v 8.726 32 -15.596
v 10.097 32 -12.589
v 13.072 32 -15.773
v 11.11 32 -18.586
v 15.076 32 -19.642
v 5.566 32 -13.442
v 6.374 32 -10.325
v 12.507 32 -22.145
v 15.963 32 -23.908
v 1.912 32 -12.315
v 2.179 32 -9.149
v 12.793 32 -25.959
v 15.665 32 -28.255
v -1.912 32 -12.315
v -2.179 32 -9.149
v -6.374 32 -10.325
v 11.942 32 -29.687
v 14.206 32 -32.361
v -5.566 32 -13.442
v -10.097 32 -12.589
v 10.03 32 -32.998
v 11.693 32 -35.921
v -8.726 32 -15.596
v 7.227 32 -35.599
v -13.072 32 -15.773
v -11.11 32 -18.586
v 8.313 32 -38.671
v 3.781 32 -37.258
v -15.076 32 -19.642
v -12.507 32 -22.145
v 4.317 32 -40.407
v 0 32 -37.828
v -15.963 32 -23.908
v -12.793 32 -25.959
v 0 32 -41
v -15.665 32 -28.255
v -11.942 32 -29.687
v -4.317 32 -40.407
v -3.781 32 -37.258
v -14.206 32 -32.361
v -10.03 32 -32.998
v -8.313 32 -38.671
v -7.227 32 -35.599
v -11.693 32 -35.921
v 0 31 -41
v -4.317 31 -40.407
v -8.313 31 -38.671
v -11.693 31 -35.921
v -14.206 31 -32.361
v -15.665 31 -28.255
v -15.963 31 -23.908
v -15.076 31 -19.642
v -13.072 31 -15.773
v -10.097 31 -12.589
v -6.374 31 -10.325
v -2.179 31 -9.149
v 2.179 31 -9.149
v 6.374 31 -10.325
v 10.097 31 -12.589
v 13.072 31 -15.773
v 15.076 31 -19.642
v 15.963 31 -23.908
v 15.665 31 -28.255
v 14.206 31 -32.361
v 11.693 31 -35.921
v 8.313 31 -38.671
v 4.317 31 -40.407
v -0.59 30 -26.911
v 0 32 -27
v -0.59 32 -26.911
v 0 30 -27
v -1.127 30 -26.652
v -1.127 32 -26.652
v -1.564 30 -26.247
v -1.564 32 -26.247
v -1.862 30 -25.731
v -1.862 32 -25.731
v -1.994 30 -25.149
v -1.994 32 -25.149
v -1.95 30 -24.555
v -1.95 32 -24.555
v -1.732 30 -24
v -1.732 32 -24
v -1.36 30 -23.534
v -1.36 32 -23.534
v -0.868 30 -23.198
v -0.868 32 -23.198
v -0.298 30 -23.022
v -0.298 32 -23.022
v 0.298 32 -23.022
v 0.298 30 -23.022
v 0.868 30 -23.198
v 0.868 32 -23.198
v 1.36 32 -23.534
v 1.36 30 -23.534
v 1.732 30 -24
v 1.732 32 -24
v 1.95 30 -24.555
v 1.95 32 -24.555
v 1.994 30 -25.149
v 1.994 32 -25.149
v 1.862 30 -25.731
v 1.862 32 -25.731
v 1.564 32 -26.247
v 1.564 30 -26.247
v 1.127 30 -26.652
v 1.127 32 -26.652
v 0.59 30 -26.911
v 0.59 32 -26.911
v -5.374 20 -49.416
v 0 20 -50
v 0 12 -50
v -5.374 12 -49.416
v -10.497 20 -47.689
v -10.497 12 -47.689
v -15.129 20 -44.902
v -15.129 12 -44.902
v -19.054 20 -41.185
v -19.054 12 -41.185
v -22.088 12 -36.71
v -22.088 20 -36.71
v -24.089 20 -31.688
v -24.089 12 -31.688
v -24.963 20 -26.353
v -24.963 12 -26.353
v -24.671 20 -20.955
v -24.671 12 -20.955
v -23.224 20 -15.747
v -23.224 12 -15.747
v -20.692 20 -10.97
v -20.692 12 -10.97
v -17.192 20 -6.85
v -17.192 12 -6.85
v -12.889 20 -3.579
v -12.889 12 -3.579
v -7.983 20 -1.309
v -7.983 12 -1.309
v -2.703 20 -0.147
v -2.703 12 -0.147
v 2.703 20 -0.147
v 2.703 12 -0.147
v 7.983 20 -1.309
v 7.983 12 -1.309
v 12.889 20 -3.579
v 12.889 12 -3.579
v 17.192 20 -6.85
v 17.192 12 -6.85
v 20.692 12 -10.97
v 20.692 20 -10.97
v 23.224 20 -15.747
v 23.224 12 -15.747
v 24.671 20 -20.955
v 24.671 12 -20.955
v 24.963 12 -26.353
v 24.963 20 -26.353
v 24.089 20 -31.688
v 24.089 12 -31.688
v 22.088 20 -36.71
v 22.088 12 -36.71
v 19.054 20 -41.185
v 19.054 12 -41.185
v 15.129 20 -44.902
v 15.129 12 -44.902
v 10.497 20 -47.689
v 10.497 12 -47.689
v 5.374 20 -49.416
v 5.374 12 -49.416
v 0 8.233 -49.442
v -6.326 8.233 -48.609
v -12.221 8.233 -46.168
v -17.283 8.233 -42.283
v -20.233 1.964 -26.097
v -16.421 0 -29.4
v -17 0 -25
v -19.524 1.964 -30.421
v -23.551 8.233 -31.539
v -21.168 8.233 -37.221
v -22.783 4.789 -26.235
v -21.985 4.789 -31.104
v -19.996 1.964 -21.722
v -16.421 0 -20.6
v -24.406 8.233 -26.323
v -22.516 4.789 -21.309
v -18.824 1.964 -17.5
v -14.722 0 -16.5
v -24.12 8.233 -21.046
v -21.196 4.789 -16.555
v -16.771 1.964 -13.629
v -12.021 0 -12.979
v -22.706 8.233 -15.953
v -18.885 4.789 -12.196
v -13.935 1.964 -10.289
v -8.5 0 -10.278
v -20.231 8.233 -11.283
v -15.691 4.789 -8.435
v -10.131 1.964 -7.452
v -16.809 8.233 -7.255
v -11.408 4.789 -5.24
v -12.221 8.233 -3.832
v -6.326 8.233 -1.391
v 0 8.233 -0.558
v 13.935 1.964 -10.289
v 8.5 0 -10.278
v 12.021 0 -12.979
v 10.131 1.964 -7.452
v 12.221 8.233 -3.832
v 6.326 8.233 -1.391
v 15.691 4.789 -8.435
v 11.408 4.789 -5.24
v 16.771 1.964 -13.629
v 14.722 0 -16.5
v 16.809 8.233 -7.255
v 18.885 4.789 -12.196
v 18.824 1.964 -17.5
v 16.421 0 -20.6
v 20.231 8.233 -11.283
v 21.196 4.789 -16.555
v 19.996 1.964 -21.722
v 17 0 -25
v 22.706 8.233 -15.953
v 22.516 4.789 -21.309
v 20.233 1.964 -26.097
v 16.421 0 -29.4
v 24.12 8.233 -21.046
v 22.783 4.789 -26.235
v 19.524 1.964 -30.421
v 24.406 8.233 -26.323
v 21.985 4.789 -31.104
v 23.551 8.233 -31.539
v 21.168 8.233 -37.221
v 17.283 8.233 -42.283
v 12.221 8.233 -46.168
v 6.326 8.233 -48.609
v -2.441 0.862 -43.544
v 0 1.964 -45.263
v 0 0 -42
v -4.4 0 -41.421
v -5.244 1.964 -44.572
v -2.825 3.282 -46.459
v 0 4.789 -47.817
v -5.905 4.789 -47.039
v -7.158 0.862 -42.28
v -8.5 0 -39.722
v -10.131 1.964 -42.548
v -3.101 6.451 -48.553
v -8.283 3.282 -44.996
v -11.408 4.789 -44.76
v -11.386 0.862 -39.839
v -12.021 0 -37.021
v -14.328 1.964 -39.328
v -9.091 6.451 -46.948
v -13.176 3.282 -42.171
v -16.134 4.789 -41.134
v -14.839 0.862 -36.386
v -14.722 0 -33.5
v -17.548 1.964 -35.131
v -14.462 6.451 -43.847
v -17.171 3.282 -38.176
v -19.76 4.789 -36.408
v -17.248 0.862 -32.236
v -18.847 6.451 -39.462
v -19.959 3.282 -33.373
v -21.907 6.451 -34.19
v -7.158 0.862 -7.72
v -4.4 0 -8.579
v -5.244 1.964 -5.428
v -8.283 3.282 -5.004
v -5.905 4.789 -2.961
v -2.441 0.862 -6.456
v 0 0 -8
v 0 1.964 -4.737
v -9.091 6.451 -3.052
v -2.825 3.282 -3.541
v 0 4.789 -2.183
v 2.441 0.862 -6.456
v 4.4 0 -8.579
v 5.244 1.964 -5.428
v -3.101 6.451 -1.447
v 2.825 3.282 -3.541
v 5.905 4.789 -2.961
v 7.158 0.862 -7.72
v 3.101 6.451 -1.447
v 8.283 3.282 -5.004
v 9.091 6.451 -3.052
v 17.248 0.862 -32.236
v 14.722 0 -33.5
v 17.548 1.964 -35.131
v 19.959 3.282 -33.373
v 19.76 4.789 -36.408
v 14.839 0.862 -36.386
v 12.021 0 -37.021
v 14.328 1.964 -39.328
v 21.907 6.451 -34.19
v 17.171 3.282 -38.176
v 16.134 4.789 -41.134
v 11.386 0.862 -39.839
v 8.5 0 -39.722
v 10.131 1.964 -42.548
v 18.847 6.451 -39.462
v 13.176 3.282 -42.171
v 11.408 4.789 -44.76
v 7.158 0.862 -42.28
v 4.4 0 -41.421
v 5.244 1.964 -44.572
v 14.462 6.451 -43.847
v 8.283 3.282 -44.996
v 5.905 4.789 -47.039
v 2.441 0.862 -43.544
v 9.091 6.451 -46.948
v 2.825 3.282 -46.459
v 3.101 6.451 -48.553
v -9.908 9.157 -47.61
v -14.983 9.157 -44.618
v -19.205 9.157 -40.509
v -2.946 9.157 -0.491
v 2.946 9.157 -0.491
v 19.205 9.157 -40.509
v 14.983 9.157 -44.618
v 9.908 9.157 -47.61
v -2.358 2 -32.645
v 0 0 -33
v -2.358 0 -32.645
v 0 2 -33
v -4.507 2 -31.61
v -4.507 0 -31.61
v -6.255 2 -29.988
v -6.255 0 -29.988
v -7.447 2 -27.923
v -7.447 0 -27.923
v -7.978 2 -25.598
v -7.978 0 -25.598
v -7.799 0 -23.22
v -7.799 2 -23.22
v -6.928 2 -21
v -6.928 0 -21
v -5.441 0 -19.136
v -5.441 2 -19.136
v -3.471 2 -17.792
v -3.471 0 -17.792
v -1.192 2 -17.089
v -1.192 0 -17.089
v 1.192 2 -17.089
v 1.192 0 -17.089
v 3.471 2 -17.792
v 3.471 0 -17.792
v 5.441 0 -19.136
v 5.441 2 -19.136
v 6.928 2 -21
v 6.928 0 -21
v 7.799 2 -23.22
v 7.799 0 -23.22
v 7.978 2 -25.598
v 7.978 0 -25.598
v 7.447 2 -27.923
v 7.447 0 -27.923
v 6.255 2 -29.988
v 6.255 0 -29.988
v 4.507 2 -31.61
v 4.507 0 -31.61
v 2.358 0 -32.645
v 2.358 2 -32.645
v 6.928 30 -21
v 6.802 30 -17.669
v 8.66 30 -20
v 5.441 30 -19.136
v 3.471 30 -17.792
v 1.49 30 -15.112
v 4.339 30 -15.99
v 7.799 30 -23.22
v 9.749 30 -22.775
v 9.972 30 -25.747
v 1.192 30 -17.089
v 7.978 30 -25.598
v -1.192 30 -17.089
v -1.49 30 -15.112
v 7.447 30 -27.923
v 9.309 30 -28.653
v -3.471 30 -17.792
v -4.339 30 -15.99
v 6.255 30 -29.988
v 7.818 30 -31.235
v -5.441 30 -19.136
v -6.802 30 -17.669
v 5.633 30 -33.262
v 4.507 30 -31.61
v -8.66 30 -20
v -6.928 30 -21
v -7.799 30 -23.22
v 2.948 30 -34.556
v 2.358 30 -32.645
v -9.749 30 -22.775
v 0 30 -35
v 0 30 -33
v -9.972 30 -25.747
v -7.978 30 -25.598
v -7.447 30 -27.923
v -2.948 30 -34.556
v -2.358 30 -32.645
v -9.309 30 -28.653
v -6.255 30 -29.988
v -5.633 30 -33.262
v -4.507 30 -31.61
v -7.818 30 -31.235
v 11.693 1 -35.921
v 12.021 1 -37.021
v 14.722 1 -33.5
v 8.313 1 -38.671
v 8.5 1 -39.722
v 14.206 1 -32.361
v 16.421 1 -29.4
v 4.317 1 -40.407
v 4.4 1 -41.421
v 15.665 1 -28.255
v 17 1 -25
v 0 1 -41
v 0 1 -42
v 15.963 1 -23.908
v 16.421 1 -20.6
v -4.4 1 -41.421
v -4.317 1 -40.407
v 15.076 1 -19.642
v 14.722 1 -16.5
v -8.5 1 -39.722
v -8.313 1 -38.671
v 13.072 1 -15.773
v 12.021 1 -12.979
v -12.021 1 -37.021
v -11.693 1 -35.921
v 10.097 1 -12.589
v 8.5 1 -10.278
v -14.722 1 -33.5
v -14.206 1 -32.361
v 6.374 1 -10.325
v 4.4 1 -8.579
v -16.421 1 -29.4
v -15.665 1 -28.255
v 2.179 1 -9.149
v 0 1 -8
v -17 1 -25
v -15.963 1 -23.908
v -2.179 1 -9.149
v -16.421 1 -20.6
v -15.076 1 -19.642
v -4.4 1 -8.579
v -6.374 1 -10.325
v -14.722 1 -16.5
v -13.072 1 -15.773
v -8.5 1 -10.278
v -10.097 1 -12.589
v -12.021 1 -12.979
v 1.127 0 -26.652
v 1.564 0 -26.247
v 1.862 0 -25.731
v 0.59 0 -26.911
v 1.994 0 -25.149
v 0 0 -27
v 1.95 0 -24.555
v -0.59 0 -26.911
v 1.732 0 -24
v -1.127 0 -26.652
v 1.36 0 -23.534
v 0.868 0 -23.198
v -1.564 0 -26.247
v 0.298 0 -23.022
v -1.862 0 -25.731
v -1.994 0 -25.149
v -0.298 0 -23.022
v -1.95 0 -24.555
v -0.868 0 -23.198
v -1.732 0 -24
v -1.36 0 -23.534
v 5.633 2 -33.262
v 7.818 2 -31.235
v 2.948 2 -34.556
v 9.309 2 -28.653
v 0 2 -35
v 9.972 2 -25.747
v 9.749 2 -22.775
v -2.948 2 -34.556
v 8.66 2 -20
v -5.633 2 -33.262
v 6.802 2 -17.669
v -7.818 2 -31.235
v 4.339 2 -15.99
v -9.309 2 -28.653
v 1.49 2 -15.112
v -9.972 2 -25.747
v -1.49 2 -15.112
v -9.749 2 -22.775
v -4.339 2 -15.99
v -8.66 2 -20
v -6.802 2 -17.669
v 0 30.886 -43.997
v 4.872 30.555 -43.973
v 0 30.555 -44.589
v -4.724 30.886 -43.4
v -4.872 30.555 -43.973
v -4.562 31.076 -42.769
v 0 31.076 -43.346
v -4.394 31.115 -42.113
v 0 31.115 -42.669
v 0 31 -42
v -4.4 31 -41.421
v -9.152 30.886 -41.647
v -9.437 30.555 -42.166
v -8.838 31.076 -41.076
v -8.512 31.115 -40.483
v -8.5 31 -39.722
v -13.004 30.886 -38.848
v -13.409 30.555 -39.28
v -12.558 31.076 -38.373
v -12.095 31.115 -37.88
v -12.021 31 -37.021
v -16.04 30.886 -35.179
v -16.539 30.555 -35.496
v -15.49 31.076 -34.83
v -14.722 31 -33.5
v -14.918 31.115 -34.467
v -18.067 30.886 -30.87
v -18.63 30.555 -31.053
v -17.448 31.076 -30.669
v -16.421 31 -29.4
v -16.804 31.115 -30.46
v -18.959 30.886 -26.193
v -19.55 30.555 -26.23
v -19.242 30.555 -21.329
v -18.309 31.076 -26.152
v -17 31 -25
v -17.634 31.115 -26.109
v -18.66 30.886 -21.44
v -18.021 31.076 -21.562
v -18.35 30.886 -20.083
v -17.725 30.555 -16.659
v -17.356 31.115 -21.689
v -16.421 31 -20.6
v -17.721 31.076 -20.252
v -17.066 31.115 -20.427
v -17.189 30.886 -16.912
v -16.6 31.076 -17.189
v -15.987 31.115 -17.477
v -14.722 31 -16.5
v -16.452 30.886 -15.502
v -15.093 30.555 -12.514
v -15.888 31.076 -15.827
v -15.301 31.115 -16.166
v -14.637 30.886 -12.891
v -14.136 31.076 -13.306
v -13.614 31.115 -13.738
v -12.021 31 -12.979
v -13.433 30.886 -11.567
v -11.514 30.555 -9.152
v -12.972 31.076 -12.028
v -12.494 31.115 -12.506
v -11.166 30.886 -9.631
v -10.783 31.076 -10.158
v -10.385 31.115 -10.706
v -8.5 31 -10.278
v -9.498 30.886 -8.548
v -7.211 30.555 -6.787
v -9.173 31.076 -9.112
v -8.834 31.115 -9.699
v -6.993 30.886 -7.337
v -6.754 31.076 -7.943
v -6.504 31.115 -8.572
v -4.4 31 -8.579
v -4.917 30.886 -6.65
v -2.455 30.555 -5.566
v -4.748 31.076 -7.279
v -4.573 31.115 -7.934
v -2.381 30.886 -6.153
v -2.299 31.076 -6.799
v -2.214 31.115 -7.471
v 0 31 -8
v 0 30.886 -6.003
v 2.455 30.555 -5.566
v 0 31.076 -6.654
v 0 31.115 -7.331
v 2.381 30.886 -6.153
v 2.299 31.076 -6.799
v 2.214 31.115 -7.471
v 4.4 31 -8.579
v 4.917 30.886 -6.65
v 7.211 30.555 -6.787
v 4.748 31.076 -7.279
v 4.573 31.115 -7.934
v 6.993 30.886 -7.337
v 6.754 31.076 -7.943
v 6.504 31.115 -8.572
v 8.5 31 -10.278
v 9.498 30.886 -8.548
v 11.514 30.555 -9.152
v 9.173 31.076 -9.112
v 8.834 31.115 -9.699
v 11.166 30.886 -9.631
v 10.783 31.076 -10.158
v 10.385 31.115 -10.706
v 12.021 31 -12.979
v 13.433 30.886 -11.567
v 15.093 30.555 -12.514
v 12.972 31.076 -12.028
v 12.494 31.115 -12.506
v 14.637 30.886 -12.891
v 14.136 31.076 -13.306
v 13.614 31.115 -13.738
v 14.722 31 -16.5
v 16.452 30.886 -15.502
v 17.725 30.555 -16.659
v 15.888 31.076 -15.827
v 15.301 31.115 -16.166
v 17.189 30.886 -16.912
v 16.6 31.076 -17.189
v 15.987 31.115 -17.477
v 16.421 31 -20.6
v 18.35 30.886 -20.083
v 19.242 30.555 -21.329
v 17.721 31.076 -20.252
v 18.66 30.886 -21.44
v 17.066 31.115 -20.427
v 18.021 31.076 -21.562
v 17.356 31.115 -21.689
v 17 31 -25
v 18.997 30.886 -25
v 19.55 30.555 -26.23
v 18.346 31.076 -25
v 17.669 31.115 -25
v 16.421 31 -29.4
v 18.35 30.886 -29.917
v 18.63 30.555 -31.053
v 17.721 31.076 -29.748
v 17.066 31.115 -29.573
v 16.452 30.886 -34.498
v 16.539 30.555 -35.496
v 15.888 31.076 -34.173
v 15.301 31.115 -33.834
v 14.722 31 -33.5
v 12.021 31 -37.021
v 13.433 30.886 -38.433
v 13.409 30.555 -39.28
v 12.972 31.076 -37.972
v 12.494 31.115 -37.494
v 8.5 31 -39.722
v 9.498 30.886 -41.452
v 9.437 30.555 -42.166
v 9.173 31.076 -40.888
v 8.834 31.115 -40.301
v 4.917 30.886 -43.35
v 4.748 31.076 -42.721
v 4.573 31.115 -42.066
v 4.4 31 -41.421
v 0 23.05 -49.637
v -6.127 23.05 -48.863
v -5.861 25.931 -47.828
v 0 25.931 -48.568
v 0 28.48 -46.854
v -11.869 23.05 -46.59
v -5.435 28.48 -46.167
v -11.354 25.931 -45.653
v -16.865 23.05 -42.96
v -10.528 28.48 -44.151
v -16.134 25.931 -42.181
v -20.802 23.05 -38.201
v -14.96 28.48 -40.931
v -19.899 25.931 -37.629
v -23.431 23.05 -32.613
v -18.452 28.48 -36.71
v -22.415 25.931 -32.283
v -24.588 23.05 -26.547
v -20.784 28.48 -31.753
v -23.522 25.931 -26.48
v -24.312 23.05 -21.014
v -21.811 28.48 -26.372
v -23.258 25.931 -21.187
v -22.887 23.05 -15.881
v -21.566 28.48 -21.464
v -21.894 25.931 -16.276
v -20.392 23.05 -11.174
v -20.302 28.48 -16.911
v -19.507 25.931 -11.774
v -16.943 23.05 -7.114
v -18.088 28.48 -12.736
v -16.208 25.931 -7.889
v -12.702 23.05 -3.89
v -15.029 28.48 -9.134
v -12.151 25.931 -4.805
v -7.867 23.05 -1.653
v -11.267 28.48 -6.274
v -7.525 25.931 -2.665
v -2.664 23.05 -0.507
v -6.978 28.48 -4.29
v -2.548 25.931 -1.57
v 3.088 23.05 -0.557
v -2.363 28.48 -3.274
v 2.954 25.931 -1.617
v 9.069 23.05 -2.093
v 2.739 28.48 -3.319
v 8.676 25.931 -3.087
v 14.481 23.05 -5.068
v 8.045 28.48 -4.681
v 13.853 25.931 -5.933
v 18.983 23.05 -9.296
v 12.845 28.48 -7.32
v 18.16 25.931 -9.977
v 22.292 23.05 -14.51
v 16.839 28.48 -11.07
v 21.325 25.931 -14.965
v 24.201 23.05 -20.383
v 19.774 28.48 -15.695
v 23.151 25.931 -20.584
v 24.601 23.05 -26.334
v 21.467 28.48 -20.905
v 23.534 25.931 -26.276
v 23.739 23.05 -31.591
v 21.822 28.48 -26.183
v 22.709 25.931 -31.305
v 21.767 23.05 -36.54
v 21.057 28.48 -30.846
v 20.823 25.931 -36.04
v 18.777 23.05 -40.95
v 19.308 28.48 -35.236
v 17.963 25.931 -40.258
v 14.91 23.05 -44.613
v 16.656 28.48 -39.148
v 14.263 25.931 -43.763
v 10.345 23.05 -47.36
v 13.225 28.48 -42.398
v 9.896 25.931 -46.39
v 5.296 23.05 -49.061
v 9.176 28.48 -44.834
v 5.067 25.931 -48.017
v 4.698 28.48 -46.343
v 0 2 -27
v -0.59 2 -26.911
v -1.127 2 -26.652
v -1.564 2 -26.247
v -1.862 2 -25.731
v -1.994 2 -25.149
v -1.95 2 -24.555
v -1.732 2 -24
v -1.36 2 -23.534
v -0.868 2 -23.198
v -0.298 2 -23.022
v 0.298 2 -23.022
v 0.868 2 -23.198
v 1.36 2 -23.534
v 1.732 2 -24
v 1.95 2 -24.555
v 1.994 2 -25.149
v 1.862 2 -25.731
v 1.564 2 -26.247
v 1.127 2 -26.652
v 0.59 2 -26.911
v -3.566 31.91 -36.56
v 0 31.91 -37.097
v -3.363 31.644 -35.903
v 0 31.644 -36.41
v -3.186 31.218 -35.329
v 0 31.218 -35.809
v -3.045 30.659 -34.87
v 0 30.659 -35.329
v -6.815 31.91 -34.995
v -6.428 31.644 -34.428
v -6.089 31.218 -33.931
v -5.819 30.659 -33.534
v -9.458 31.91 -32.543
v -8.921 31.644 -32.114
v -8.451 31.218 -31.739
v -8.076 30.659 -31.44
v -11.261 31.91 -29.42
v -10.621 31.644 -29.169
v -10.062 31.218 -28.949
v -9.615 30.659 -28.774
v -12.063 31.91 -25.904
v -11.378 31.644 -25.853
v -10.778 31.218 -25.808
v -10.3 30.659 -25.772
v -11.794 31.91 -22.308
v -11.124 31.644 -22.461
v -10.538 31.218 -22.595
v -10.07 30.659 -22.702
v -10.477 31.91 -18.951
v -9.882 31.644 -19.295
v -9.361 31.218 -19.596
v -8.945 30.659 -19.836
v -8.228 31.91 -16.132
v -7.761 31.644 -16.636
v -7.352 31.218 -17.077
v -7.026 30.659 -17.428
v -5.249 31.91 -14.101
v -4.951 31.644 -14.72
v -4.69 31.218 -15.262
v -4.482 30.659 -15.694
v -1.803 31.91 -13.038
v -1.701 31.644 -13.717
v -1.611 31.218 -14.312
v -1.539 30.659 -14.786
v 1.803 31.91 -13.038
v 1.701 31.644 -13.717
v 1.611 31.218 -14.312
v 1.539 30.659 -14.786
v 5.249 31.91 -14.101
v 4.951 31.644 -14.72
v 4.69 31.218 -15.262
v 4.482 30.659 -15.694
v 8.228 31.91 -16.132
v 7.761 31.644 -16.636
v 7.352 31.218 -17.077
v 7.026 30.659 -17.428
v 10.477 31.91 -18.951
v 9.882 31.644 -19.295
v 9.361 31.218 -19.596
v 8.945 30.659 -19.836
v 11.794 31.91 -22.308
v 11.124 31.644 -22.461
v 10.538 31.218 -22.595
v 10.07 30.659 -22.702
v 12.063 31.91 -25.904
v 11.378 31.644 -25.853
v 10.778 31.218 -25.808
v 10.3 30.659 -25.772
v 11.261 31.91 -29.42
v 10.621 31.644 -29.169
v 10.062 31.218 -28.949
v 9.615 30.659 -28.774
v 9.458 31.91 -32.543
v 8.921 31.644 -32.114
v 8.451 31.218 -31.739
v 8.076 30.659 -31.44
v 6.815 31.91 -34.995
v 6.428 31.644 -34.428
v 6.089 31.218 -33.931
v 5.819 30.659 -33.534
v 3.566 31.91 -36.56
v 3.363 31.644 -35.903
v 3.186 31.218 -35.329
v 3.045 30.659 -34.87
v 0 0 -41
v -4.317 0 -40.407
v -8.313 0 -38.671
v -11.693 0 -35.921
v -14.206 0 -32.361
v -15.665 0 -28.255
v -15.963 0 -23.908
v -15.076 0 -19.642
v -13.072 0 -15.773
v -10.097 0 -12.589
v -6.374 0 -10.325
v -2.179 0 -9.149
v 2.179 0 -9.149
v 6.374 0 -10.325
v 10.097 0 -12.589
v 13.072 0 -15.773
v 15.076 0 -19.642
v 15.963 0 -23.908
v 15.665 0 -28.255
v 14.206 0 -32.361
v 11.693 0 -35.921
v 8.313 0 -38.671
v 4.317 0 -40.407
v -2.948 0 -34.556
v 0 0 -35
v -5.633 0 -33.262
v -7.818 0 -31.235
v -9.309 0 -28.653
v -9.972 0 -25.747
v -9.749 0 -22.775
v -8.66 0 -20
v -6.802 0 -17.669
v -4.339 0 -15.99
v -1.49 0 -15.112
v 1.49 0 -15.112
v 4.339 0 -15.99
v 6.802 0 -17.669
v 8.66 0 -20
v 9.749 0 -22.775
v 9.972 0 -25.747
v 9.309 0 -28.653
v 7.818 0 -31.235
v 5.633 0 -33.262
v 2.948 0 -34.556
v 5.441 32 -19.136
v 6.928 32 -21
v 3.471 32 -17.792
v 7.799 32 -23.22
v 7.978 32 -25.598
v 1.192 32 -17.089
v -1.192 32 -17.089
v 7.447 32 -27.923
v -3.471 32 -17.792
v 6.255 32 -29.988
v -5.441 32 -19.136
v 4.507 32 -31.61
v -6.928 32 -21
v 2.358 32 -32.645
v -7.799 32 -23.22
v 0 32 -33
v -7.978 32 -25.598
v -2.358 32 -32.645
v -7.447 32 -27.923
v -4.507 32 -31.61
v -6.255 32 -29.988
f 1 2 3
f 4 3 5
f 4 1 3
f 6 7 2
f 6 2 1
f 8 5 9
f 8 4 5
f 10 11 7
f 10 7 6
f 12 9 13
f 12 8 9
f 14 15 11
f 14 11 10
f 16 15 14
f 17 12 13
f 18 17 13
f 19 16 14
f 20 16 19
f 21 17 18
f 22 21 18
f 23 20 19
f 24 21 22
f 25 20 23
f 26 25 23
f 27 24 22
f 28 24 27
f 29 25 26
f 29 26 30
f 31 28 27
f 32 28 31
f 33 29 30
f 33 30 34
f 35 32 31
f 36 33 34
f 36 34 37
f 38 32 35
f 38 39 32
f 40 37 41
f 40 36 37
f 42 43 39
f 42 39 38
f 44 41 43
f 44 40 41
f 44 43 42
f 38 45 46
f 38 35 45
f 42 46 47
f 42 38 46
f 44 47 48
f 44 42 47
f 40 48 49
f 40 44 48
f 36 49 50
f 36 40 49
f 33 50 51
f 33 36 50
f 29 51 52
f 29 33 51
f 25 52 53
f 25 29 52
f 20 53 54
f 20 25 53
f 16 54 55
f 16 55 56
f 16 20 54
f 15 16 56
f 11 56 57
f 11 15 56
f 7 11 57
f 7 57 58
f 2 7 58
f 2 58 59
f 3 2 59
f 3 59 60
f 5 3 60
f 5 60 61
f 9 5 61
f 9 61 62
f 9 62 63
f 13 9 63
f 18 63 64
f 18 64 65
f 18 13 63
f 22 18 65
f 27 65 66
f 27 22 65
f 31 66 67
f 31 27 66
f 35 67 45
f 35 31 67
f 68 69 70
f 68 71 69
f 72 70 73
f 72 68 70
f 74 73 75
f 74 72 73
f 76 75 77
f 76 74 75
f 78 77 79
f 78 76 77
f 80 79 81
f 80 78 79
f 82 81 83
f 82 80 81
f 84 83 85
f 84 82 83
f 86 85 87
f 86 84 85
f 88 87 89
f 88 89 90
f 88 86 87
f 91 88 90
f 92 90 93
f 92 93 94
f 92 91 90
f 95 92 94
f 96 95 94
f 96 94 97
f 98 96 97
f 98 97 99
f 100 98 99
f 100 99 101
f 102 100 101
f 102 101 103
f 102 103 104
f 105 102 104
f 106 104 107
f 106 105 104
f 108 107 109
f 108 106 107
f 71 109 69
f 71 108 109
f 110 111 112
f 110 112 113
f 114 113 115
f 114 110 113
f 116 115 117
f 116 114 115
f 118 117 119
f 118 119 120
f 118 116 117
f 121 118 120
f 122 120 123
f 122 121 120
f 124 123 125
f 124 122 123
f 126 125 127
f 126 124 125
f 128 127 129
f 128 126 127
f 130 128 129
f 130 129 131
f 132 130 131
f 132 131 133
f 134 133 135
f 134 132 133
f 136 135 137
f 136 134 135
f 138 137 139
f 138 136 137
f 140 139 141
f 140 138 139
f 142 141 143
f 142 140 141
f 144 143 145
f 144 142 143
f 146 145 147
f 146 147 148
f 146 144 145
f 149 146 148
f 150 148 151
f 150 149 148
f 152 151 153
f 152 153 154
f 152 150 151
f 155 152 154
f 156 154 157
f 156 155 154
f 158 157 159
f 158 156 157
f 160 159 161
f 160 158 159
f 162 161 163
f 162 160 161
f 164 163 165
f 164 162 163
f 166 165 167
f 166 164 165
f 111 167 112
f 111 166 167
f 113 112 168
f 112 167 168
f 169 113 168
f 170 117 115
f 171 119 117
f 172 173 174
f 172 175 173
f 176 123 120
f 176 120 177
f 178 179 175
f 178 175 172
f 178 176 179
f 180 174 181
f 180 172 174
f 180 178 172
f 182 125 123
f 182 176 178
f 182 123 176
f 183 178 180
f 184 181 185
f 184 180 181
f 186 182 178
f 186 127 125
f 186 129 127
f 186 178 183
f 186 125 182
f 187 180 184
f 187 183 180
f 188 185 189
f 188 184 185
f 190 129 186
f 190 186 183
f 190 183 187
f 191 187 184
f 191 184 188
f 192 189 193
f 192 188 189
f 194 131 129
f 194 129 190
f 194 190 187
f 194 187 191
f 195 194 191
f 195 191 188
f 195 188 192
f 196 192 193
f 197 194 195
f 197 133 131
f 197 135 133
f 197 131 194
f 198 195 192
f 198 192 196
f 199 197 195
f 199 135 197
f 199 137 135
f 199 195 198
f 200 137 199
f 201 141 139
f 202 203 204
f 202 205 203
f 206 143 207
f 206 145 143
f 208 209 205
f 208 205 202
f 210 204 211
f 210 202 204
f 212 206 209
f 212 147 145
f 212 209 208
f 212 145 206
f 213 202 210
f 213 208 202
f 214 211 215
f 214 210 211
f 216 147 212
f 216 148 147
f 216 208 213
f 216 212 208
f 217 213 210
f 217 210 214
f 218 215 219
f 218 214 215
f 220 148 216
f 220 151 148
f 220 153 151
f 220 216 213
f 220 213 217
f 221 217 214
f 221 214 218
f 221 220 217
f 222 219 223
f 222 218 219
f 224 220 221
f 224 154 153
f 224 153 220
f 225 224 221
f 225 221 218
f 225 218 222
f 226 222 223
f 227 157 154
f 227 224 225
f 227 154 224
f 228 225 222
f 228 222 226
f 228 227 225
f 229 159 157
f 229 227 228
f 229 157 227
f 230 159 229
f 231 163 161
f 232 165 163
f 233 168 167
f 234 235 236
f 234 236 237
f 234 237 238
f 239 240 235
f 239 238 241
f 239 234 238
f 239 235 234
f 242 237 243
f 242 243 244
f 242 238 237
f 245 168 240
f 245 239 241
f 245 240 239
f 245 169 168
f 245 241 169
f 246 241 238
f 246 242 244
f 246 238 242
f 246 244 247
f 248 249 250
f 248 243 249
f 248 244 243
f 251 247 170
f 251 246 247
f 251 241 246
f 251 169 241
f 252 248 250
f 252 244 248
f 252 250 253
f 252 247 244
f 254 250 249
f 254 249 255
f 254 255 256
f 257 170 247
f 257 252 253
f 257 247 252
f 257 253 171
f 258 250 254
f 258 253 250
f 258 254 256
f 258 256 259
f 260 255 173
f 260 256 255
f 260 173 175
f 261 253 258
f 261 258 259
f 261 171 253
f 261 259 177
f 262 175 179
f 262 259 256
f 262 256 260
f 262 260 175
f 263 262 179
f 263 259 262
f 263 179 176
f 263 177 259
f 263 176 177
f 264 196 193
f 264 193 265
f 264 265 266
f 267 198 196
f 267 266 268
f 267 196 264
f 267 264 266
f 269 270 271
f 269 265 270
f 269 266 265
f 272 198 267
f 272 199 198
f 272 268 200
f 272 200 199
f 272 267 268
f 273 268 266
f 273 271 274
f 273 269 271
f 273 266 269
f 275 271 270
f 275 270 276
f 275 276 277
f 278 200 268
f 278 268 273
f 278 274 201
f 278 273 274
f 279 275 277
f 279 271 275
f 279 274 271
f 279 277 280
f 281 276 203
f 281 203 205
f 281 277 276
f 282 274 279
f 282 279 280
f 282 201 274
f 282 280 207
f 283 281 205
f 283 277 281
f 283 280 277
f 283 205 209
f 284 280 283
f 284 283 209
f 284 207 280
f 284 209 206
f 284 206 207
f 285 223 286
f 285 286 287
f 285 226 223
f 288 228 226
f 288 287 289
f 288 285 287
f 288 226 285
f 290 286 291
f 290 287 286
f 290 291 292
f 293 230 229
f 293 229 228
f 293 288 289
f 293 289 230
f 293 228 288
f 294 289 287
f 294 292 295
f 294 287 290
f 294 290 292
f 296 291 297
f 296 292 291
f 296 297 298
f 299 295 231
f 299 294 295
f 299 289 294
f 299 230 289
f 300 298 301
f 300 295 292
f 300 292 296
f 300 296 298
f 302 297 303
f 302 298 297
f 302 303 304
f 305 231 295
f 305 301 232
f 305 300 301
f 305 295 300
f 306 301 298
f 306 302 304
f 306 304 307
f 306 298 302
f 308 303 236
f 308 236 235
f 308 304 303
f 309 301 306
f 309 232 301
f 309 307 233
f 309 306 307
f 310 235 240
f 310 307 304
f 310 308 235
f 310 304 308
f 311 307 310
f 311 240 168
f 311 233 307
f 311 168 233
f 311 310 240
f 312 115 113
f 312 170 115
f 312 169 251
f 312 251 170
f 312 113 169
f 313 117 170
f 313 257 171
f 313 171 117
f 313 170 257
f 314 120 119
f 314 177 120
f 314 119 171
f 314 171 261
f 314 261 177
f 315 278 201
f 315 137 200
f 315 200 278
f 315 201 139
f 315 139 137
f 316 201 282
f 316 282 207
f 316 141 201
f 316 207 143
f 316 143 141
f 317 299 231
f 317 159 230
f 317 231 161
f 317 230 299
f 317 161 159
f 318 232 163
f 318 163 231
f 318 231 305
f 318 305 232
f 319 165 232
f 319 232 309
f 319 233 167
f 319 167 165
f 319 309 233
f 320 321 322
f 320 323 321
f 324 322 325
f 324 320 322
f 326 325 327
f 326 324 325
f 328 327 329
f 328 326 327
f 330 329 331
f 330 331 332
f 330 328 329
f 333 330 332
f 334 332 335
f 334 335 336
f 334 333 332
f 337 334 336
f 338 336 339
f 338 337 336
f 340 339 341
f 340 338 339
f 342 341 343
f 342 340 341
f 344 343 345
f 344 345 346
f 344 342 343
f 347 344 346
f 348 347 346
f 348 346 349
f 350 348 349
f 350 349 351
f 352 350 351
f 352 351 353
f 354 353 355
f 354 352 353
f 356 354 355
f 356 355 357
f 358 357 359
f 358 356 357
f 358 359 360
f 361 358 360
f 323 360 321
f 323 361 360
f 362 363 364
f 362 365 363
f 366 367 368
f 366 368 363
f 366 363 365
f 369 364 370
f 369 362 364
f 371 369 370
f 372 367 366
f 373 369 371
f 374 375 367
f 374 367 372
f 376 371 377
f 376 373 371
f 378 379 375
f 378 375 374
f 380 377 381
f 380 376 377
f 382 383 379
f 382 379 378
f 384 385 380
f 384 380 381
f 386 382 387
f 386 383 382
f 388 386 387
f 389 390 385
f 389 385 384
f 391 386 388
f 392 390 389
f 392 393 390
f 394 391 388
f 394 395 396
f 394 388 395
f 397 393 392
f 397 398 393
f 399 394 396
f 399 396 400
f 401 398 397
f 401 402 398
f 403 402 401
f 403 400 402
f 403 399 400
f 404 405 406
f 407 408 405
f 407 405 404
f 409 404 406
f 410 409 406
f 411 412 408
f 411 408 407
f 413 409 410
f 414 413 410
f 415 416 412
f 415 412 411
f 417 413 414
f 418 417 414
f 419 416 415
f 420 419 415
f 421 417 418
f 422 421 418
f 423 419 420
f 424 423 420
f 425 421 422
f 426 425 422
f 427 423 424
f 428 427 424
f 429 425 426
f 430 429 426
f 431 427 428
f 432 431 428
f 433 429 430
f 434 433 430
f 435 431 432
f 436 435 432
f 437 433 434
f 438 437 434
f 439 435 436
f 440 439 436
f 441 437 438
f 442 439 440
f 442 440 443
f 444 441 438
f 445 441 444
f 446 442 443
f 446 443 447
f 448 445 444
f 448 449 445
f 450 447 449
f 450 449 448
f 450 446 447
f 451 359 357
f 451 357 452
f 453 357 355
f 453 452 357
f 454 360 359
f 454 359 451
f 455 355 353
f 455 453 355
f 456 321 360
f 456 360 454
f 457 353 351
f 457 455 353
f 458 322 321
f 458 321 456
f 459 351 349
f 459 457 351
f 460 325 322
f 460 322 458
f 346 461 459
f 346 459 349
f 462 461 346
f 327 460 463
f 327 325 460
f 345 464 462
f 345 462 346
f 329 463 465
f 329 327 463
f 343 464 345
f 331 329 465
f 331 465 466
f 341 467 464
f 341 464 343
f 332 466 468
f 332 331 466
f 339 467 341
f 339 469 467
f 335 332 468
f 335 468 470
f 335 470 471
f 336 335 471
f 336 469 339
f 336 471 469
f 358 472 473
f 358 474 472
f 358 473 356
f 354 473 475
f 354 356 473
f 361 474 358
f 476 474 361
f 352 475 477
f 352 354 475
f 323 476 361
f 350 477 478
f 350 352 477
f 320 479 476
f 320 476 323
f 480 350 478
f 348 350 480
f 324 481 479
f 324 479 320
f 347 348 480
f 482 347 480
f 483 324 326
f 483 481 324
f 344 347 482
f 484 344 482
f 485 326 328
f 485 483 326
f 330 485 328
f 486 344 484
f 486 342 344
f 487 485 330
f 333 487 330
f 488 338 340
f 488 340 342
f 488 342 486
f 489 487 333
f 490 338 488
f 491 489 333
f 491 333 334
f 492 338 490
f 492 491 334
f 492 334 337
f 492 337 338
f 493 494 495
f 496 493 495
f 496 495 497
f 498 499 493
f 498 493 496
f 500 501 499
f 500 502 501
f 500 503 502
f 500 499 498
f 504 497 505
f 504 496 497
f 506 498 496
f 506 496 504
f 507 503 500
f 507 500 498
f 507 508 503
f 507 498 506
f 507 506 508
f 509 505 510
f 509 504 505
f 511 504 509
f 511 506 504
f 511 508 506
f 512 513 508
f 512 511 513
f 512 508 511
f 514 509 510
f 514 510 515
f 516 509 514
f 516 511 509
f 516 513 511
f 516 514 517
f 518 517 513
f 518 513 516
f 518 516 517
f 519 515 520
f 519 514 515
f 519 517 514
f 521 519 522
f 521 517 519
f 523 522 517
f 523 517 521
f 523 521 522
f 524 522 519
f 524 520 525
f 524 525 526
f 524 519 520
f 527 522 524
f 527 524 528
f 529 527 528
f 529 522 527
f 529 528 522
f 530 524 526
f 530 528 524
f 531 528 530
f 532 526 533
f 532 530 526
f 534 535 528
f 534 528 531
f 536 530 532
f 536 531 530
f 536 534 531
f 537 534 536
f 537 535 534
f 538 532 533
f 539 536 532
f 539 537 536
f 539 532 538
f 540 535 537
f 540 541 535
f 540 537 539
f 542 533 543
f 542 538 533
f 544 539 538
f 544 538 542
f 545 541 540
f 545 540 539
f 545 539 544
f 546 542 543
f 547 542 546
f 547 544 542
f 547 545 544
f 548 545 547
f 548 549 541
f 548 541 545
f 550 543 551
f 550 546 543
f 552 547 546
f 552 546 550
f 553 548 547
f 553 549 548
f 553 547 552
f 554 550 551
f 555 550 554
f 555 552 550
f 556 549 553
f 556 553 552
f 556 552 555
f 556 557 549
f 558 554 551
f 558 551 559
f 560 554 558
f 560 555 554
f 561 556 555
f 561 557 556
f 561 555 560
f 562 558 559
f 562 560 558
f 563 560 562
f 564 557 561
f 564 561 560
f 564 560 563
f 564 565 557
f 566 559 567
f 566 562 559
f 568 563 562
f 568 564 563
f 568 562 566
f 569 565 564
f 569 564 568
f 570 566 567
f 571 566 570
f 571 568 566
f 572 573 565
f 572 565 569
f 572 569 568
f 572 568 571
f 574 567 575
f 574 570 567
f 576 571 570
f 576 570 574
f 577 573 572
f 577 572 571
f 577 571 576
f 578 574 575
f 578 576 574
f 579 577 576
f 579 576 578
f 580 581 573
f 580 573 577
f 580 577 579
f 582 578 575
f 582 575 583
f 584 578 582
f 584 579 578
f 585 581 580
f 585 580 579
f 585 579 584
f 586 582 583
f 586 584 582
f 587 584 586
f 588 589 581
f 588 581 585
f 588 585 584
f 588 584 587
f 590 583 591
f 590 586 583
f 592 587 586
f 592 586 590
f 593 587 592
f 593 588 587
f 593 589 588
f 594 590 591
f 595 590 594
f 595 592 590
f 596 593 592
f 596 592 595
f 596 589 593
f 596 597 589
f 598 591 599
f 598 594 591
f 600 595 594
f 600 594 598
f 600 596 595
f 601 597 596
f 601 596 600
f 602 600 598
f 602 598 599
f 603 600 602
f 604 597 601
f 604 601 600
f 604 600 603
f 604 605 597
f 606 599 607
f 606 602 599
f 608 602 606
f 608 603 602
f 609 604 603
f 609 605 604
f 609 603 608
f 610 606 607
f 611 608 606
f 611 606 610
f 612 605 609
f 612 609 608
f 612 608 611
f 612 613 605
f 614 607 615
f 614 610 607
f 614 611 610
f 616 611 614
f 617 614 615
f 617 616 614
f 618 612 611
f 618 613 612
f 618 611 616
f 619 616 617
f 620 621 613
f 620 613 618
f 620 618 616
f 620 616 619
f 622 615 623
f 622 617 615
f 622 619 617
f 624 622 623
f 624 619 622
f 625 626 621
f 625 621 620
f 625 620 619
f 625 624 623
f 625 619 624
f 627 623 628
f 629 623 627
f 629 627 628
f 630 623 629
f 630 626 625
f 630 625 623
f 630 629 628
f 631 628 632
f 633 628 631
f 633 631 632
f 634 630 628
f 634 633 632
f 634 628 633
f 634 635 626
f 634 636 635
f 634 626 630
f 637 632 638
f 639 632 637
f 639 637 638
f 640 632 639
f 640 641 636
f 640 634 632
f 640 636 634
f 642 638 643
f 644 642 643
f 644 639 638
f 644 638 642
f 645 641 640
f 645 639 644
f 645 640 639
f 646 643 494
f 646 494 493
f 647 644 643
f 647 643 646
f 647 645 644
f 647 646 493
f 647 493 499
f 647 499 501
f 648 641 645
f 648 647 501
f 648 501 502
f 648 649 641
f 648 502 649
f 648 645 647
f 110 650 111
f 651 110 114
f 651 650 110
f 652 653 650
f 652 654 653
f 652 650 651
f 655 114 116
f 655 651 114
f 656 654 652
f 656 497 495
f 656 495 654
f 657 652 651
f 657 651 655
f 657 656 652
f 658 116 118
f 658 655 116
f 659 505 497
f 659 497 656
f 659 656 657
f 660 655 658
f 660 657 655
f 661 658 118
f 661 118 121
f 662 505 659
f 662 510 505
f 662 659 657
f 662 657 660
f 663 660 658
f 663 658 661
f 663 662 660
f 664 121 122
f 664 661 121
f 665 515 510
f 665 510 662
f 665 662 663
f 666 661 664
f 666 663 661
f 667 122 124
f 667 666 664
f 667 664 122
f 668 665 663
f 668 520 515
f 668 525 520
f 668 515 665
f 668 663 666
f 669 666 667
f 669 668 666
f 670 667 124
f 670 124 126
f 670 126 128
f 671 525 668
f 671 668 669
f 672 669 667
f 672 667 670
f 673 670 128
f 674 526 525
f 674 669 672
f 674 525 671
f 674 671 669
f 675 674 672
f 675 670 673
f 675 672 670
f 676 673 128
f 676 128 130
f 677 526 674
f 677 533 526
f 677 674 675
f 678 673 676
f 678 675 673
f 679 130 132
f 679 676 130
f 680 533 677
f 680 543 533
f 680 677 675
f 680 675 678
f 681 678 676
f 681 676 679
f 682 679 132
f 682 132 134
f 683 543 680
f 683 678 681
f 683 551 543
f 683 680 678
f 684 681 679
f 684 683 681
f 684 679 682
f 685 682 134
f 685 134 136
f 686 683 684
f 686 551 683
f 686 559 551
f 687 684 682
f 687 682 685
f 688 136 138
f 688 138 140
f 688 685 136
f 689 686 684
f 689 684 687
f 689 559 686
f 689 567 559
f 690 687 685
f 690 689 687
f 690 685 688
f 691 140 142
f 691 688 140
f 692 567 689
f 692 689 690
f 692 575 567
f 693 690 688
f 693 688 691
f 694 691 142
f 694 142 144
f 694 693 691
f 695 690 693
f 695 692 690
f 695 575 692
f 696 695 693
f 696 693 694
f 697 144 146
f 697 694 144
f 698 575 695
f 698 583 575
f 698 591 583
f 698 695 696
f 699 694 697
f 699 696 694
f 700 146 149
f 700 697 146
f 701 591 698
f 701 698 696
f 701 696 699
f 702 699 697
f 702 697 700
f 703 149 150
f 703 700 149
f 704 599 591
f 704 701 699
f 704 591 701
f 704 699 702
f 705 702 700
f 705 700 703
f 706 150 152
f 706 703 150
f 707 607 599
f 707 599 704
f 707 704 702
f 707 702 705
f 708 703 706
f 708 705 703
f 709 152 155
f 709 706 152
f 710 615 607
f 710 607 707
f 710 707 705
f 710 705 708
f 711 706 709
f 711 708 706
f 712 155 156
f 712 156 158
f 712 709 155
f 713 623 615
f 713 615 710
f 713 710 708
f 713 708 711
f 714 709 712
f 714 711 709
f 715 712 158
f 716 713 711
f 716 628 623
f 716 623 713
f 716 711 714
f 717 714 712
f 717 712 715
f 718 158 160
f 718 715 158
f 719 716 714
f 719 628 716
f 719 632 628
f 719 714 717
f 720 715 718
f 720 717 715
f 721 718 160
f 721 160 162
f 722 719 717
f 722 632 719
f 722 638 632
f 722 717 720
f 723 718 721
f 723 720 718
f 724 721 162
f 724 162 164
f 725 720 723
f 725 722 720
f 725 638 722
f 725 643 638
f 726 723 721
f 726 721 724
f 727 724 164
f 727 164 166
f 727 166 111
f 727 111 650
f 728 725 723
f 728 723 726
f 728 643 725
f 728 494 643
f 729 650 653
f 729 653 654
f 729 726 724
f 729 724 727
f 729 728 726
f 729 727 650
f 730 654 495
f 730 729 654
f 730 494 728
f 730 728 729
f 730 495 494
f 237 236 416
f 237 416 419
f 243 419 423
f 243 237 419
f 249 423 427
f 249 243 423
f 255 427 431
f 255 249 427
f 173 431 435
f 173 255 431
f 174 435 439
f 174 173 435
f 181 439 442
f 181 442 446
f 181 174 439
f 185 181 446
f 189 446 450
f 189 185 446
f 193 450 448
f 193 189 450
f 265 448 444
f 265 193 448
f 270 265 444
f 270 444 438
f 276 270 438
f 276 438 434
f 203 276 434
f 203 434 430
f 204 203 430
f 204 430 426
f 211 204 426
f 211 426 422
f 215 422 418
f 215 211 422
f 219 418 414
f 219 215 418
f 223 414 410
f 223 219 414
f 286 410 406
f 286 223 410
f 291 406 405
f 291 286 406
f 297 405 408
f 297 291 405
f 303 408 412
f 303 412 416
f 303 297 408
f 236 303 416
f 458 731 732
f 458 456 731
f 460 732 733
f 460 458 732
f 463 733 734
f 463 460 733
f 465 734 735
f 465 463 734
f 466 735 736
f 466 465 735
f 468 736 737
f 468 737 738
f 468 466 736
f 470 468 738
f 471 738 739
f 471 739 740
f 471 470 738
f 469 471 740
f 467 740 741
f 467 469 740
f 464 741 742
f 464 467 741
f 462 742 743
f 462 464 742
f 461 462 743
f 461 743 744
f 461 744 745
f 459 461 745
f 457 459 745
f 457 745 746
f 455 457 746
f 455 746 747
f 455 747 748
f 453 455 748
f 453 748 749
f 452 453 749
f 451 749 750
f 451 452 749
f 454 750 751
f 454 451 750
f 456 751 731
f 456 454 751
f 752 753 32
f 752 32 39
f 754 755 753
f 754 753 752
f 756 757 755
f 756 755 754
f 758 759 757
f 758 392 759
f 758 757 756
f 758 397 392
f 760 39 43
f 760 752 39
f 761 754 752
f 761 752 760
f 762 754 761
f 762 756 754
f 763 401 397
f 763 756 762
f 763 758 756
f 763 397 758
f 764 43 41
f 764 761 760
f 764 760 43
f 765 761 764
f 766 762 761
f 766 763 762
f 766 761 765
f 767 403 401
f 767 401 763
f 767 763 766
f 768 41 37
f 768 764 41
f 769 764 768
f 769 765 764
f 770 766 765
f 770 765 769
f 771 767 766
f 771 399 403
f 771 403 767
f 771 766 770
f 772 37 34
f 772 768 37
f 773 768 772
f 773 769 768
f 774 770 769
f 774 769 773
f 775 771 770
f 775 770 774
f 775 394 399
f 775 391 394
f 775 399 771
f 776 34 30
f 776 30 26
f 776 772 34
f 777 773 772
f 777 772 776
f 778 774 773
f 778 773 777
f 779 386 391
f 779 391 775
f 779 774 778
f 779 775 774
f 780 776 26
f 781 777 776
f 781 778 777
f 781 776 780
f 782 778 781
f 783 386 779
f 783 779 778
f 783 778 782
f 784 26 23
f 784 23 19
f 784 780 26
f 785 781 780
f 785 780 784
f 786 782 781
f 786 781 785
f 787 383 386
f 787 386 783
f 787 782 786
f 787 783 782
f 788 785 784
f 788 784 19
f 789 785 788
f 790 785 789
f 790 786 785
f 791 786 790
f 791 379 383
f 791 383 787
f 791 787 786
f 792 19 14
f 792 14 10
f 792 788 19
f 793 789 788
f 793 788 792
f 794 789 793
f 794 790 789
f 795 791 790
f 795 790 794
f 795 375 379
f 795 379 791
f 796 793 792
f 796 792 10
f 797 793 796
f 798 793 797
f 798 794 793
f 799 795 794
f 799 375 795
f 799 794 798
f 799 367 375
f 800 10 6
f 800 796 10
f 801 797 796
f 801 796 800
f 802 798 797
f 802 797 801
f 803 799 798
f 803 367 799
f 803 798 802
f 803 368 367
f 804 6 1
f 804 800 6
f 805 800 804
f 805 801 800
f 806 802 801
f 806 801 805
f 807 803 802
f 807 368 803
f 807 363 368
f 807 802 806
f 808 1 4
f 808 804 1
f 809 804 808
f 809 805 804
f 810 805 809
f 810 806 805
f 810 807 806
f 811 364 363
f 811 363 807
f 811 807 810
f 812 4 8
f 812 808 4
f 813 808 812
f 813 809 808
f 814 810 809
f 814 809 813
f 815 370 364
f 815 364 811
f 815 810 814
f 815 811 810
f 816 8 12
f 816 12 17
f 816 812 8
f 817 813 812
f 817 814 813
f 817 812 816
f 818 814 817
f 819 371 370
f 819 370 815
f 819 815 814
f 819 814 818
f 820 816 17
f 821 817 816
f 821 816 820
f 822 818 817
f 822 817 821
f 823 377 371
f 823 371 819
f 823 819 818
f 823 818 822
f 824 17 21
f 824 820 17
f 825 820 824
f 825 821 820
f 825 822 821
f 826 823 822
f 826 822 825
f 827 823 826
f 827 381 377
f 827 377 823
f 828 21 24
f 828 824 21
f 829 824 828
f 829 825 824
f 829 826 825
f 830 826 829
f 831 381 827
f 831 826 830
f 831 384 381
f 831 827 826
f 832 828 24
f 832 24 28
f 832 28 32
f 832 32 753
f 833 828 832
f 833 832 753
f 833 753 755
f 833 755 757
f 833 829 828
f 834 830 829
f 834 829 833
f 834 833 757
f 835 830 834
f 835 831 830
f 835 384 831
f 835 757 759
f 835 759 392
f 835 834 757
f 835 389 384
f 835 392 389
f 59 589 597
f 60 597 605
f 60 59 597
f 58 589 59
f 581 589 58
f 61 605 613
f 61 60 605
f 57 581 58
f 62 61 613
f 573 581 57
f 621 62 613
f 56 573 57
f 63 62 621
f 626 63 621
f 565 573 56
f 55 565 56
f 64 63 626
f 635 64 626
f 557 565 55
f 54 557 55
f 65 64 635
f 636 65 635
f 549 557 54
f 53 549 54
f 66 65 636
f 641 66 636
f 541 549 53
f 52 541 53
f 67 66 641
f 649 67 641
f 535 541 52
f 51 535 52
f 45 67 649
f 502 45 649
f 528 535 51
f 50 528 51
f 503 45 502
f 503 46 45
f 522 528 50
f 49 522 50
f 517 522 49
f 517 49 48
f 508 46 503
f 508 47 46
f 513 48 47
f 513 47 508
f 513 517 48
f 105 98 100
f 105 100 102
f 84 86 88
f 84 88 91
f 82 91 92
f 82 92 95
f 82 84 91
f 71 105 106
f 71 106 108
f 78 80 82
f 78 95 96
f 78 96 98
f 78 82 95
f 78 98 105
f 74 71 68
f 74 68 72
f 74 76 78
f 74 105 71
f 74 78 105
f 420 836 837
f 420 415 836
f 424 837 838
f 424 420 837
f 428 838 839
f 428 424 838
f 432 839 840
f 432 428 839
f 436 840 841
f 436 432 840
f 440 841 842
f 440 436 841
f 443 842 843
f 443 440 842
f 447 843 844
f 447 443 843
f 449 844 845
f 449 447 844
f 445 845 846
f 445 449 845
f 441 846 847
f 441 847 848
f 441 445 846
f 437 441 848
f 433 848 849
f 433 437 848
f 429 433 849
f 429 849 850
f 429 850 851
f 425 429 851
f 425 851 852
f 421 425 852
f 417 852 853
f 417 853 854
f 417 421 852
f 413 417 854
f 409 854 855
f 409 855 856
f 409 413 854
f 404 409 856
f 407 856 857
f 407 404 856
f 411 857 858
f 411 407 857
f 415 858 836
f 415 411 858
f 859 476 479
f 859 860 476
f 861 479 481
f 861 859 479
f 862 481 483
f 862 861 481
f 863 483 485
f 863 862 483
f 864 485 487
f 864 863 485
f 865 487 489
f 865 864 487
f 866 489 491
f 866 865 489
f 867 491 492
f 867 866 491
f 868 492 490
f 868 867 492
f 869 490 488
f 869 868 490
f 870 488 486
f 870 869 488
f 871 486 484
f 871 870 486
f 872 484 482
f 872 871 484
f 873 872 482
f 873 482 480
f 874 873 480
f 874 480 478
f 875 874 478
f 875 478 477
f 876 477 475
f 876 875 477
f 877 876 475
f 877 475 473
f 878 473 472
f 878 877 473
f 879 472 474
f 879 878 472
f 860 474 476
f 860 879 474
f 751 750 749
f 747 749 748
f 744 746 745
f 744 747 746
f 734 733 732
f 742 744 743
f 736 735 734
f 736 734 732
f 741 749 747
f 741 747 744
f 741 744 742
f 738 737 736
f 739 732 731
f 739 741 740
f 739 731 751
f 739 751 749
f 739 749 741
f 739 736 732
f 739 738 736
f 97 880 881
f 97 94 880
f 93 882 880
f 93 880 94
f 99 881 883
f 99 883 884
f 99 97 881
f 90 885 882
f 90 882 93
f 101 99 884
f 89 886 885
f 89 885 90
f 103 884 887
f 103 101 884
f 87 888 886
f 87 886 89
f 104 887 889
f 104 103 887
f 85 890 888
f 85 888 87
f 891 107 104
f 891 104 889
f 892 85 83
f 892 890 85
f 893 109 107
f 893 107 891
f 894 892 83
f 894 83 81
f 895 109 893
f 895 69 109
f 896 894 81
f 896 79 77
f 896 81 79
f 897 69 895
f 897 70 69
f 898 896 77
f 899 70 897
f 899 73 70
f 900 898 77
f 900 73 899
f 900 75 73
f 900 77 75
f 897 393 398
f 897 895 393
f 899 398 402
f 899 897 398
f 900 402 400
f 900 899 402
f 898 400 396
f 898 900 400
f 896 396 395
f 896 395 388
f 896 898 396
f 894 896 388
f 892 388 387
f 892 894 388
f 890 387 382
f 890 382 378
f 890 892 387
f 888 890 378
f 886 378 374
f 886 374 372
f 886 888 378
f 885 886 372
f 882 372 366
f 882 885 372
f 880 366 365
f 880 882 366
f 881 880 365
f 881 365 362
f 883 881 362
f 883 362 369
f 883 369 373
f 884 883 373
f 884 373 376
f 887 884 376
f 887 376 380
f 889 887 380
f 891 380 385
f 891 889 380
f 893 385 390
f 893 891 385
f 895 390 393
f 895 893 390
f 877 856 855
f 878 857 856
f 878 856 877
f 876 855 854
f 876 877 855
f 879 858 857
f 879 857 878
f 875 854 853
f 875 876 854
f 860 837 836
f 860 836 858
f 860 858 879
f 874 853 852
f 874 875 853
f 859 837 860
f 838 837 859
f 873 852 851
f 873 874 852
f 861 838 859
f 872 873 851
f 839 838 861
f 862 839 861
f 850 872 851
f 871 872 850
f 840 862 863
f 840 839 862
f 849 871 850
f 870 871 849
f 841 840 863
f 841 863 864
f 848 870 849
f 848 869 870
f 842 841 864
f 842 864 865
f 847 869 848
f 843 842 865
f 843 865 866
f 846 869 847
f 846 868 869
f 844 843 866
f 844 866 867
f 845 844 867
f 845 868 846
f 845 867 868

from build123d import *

# Parameters (mm, degrees)
FILLET_1_R = 13
FILLET_3_R = 3
FILLET_4_R = 3


with BuildPart() as part:
    # 草图1 → 旋转1 (revolve)
    with BuildSketch(Plane(origin=(0, 0, 0), x_dir=(0, 0, -1), z_dir=(1, 0, 0)), mode=Mode.PRIVATE) as revolve_1_sk:
        Polygon((17, 32), (23, 32), (23, 30), (25, 30), (25, 2), (23, 2), (23, 0), (17, 0), (17, 2), (15, 2), (15, 0), (9, 0), (9, 1), (8, 1), (8, 0), (0, 0), (0, 32), (8, 32), (8, 31), (9, 31), (9, 32), (15, 32), (15, 30), (17, 30), align=None)
    revolve(revolve_1_sk.sketch.rotate(Axis((0, 2, -25), (0, 1, 0)), 180), axis=Axis((0, 2, -25), (0, 1, 0)))

    # 圆角1
    # the kernel refuses this fillet: 13 mm, written as the material it takes off along each edge
    with BuildSketch(Plane(origin=(0, 0, -25), x_dir=(0, 0, -1), z_dir=(1, 0, 0))) as fillet_1_piece_1:
        with BuildLine():
            CenterArc((12, 12), FILLET_1_R, 292.619864948, 67.380135052)
            Line((25, 12), (25.26, 12))
            Line((25.26, 12), (25.26, 0))
            Line((25.26, 0), (25, -0.26))
            ThreePointArc((25, -0.26), (21, -0.26), (17.1, -0.24))
            Line((17.1, -0.24), (17, 0))
        make_face()
    revolve(axis=Axis((0, 0, -25), (0, 1, 0)), mode=Mode.SUBTRACT)
    with BuildSketch(Plane(origin=(0, 32, -25), x_dir=(0, 0, -1), z_dir=(1, 0, 0))) as fillet_1_piece_2:
        with BuildLine():
            CenterArc((12, -12), FILLET_1_R, 0, 67.380135052)
            Line((17, 0), (17.1, 0.24))
            ThreePointArc((17.1, 0.24), (21, 0.26), (25, 0.26))
            Line((25, 0.26), (25.26, 0))
            Line((25.26, 0), (25.26, -12))
            Line((25.26, -12), (25, -12))
        make_face()
    revolve(axis=Axis((0, 32, -25), (0, 1, 0)), mode=Mode.SUBTRACT)

    # 圆角3
    # the kernel refuses this fillet: 3 mm, written as the material it takes off along each edge
    with BuildSketch(Plane(origin=(0, 32, -25), x_dir=(0, 0, -1), z_dir=(1, 0, 0))) as fillet_3_piece_1:
        with BuildLine():
            CenterArc((12.828427125, -3), FILLET_3_R, 90, 70.528779366)
            Line((12.828427125, 0), (12.828427125, 0.06))
            Line((12.828427125, 0.06), (10, 0.06))
            Line((10, 0.06), (9.94, 0))
            ThreePointArc((9.94, 0), (9.94, -1), (9.943431458, -1.98))
            Line((9.943431458, -1.98), (10, -2))
        make_face()
    revolve(axis=Axis((0, 32, -25), (0, 1, 0)), mode=Mode.SUBTRACT)

    # 圆角4
    # the kernel refuses this fillet: 3 mm, written as the material it takes off along each edge
    with BuildSketch(Plane(origin=(0, 32, -25), x_dir=(0, 0, -1), z_dir=(1, 0, 0))) as fillet_4_piece_1:
        with BuildLine():
            CenterArc((17.837561952, -3.880709978), FILLET_4_R, 54.28483058, 51.926876677)
            Line((19.588830537, -1.444922971), (19.623855909, -1.396207231))
            ThreePointArc((19.623855909, -1.396207231), (18.364982894, -0.596027325), (17.023076923, 0.055384615))
            Line((17.023076923, 0.055384615), (16.94, 0))
            ThreePointArc((16.94, 0), (16.94, -0.5), (16.983248761, -0.9423858))
            Line((16.983248761, -0.9423858), (17, -1))
        make_face()
    revolve(axis=Axis((0, 32, -25), (0, 1, 0)), mode=Mode.SUBTRACT)


solid = part.part
